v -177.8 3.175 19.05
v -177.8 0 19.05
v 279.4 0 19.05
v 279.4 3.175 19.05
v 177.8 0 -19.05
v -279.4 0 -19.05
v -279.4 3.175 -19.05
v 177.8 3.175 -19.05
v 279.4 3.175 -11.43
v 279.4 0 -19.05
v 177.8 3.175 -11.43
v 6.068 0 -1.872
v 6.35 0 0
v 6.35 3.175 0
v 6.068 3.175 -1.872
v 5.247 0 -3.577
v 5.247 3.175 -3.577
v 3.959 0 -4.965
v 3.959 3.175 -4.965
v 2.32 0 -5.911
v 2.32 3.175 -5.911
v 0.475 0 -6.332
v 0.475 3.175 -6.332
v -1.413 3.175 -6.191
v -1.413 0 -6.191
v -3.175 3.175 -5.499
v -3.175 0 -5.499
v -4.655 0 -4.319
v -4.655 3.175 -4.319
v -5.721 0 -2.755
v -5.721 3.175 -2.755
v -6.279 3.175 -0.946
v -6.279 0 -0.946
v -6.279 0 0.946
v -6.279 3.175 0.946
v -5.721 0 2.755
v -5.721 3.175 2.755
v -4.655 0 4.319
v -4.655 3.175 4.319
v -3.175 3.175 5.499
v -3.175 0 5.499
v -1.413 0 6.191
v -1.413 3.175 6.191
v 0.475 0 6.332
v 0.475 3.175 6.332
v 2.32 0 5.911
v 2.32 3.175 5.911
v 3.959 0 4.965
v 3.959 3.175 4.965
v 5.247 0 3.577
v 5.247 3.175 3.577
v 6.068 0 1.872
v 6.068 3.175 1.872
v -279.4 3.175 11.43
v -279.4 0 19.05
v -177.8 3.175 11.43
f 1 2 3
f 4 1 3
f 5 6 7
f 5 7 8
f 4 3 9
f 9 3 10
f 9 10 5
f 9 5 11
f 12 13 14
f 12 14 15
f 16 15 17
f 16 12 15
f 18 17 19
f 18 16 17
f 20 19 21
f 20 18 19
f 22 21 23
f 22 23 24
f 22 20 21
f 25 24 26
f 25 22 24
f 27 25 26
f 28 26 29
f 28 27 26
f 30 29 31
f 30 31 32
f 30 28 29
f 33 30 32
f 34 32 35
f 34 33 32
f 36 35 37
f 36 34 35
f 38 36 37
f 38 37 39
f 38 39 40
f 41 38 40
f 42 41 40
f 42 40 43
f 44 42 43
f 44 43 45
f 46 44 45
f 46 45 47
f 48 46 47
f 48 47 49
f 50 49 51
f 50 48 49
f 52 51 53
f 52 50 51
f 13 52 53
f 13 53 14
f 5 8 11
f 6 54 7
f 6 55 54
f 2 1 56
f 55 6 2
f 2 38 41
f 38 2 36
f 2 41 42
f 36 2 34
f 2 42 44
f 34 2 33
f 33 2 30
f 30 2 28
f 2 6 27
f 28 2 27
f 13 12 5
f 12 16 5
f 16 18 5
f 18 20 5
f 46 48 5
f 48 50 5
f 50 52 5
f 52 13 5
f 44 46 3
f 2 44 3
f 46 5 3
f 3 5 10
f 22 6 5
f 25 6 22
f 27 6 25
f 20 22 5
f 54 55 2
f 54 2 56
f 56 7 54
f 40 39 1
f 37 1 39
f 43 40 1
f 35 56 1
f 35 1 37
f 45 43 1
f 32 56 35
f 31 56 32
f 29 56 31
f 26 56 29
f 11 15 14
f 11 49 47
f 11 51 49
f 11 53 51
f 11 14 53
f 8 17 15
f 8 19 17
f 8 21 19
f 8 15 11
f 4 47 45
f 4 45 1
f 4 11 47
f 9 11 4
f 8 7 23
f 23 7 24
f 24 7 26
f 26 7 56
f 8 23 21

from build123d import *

# Parameters (mm, degrees)
SKETCH2_W            = 558.8
SKETCH2_H            = 38.1
SKETCH2_R            = 6.35
MOWER_BLADE_DEPTH    = 3.175
CUTTING_EDGE_1_DEPTH = 101.6
CUTTING_EDGE_2_DEPTH = 101.6


with BuildPart() as part:
    # Sketch2 → Mower Blade (new body)
    with BuildSketch(Plane(origin=(0, 0, 0), x_dir=(1, 0, 0), z_dir=(0, 1, 0))):
        Rectangle(SKETCH2_W, SKETCH2_H)
        Circle(SKETCH2_R, mode=Mode.SUBTRACT)
    extrude(amount=MOWER_BLADE_DEPTH)

    # Sketch3 → Cutting Edge #1 (cut)
    with BuildSketch(Plane(origin=(279.4, 0, 0), x_dir=(0, 0, -1), z_dir=(1, 0, 0))):
        Polygon((19.05, 0), (11.43, 3.175), (19.05, 3.175), align=None)
    extrude(amount=-CUTTING_EDGE_1_DEPTH, mode=Mode.SUBTRACT)

    # Sketch4 → Cutting Edge #2 (cut)
    with BuildSketch(Plane.ZY.offset(279.4)):
        Polygon((19.05, 0), (11.43, 3.175), (19.05, 3.175), align=None)
    extrude(amount=-CUTTING_EDGE_2_DEPTH, mode=Mode.SUBTRACT)


solid = part.part
